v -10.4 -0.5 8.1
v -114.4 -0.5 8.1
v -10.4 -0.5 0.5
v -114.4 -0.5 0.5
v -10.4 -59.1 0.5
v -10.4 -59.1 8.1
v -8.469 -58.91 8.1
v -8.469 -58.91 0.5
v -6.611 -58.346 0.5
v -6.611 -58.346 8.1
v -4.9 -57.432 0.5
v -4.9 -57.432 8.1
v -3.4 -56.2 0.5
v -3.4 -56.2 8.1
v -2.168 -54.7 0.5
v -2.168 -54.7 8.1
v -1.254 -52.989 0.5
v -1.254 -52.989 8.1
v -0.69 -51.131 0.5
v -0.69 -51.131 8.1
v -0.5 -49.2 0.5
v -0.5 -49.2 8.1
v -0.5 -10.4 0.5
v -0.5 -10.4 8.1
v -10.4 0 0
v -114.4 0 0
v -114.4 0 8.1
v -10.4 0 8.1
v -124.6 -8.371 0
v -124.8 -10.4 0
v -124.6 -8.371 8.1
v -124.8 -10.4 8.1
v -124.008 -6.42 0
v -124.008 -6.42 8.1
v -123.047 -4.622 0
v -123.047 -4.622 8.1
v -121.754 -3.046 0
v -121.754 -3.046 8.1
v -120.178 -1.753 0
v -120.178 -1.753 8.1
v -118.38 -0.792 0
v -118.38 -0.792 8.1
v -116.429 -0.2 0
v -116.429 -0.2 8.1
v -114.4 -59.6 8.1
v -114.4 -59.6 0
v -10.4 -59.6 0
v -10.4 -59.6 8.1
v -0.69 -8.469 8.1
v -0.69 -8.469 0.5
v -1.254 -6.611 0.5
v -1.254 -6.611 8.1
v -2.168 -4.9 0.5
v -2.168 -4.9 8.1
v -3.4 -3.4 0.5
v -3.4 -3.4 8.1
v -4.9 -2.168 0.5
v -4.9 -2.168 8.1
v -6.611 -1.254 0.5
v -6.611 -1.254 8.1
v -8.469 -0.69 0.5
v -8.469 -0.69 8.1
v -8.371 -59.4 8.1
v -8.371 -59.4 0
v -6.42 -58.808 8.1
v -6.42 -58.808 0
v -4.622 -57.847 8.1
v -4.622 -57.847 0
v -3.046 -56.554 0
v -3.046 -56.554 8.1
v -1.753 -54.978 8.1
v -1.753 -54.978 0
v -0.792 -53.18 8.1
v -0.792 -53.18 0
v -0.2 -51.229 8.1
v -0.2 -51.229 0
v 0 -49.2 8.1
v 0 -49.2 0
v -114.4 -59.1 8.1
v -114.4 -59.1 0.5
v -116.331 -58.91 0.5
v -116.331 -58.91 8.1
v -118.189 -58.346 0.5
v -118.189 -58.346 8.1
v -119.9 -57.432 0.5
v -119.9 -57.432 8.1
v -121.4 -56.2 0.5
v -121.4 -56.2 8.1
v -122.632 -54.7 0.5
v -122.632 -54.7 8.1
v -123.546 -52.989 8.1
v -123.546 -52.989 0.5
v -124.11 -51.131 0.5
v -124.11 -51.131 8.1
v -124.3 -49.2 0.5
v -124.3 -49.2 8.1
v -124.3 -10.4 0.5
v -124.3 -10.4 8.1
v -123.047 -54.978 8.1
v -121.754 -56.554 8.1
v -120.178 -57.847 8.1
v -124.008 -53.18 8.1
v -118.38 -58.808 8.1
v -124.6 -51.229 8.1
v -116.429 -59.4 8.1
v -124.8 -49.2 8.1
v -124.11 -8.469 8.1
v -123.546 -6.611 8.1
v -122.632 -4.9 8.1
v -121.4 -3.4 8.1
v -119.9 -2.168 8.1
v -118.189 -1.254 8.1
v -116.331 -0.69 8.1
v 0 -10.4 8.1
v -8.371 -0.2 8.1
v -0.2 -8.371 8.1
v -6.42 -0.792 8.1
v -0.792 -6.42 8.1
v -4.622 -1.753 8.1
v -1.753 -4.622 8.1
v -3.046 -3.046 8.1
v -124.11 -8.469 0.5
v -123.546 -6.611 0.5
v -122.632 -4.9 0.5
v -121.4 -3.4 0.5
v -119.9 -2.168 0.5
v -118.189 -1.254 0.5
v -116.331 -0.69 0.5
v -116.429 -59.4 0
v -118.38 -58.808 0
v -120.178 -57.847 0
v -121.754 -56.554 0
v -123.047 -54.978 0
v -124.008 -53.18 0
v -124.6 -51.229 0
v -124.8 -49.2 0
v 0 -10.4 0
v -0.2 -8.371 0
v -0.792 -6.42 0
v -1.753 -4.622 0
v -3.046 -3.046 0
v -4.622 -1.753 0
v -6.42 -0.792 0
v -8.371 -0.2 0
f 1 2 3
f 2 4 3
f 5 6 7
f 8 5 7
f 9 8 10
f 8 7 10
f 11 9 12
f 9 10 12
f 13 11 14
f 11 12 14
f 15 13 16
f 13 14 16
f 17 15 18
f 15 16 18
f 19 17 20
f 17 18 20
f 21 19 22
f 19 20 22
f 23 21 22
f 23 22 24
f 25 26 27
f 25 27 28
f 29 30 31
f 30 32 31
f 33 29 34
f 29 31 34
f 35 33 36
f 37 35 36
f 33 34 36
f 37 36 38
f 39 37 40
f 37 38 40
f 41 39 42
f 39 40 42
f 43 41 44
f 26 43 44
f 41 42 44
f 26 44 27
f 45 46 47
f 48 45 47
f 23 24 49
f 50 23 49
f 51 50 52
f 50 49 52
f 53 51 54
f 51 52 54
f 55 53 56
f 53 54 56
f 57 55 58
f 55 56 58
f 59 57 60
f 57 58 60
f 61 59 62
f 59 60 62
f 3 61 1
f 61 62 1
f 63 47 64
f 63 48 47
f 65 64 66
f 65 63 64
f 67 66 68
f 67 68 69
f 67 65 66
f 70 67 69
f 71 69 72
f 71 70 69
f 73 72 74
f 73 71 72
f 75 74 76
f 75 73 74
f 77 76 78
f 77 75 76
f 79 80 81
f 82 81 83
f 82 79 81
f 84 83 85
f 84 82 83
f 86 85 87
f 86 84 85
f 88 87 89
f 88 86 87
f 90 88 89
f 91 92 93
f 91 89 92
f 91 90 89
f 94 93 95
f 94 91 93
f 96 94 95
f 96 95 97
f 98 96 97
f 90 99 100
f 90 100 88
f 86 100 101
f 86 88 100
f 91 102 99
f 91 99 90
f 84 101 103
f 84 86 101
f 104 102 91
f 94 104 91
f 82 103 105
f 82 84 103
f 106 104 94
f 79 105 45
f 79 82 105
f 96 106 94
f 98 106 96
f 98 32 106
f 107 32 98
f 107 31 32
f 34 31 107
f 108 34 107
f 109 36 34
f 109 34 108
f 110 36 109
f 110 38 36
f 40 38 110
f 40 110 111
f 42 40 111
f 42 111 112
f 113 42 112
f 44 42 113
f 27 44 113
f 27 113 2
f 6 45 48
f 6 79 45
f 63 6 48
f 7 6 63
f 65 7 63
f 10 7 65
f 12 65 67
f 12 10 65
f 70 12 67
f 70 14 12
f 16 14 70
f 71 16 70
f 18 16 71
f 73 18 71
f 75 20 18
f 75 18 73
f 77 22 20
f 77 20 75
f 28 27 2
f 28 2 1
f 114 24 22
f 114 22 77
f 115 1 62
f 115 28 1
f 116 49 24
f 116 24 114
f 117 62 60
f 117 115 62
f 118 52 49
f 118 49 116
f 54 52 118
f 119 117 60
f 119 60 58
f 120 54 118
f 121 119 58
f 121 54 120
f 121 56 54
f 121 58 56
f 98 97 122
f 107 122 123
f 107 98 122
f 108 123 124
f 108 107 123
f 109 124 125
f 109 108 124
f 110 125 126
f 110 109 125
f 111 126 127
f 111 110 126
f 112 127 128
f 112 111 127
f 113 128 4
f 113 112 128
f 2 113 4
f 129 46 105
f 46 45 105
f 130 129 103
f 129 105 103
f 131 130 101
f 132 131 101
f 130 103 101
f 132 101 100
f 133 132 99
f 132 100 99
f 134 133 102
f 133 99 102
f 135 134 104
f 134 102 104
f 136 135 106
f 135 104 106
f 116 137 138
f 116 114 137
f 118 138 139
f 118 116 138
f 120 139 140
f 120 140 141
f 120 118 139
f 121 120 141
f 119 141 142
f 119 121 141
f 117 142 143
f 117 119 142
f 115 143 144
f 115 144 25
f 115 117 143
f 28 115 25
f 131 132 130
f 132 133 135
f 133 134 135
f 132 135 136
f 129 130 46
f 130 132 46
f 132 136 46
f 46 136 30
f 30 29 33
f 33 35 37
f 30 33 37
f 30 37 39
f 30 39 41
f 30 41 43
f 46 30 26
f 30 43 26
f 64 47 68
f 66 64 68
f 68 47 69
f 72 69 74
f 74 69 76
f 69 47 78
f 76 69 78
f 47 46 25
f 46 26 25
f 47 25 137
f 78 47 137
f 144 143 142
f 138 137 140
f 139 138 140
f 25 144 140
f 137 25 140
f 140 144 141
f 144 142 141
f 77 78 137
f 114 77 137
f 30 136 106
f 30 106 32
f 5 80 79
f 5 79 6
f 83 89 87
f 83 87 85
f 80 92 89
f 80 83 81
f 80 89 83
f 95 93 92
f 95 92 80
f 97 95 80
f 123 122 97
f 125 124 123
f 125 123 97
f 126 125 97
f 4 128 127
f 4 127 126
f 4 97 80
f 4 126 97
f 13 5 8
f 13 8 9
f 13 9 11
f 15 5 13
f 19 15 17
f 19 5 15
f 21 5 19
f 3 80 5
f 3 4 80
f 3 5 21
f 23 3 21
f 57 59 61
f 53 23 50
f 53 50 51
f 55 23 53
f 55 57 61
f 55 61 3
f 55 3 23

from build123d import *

# Parameters (mm, degrees)
F0_W     = 124.8
F0_H     = 59.6
F1_DEPTH = 8.1
F2_R     = 10.4
F3_R     = 10.4
F4_T     = -0.5


with BuildPart() as f1:
    # F0 (on Top) → F1 (new body)
    with BuildSketch(Plane.XY):
        with Locations((-62.4, -29.8)):
            Rectangle(F0_W, F0_H)
    extrude(amount=F1_DEPTH)

    # F2
    f2_edges = [f1.edges().sort_by_distance(p)[0] for p in [
        (0, -59.6, 4.05),
    ]]
    fillet(f2_edges, radius=F2_R)

    # F3
    f3_edges = [f1.edges().sort_by_distance(p)[0] for p in [
        (0, 0, 4.05),
        (-124.8, -59.6, 4.05),
        (-124.8, 0, 4.05),
    ]]
    fillet(f3_edges, radius=F3_R)

    # F4
    f4_openings = [f1.faces().sort_by_distance(p)[0] for p in [
        (-62.4, -29.8, 8.1),
    ]]
    offset(amount=F4_T, openings=f4_openings)


solid = f1.part
